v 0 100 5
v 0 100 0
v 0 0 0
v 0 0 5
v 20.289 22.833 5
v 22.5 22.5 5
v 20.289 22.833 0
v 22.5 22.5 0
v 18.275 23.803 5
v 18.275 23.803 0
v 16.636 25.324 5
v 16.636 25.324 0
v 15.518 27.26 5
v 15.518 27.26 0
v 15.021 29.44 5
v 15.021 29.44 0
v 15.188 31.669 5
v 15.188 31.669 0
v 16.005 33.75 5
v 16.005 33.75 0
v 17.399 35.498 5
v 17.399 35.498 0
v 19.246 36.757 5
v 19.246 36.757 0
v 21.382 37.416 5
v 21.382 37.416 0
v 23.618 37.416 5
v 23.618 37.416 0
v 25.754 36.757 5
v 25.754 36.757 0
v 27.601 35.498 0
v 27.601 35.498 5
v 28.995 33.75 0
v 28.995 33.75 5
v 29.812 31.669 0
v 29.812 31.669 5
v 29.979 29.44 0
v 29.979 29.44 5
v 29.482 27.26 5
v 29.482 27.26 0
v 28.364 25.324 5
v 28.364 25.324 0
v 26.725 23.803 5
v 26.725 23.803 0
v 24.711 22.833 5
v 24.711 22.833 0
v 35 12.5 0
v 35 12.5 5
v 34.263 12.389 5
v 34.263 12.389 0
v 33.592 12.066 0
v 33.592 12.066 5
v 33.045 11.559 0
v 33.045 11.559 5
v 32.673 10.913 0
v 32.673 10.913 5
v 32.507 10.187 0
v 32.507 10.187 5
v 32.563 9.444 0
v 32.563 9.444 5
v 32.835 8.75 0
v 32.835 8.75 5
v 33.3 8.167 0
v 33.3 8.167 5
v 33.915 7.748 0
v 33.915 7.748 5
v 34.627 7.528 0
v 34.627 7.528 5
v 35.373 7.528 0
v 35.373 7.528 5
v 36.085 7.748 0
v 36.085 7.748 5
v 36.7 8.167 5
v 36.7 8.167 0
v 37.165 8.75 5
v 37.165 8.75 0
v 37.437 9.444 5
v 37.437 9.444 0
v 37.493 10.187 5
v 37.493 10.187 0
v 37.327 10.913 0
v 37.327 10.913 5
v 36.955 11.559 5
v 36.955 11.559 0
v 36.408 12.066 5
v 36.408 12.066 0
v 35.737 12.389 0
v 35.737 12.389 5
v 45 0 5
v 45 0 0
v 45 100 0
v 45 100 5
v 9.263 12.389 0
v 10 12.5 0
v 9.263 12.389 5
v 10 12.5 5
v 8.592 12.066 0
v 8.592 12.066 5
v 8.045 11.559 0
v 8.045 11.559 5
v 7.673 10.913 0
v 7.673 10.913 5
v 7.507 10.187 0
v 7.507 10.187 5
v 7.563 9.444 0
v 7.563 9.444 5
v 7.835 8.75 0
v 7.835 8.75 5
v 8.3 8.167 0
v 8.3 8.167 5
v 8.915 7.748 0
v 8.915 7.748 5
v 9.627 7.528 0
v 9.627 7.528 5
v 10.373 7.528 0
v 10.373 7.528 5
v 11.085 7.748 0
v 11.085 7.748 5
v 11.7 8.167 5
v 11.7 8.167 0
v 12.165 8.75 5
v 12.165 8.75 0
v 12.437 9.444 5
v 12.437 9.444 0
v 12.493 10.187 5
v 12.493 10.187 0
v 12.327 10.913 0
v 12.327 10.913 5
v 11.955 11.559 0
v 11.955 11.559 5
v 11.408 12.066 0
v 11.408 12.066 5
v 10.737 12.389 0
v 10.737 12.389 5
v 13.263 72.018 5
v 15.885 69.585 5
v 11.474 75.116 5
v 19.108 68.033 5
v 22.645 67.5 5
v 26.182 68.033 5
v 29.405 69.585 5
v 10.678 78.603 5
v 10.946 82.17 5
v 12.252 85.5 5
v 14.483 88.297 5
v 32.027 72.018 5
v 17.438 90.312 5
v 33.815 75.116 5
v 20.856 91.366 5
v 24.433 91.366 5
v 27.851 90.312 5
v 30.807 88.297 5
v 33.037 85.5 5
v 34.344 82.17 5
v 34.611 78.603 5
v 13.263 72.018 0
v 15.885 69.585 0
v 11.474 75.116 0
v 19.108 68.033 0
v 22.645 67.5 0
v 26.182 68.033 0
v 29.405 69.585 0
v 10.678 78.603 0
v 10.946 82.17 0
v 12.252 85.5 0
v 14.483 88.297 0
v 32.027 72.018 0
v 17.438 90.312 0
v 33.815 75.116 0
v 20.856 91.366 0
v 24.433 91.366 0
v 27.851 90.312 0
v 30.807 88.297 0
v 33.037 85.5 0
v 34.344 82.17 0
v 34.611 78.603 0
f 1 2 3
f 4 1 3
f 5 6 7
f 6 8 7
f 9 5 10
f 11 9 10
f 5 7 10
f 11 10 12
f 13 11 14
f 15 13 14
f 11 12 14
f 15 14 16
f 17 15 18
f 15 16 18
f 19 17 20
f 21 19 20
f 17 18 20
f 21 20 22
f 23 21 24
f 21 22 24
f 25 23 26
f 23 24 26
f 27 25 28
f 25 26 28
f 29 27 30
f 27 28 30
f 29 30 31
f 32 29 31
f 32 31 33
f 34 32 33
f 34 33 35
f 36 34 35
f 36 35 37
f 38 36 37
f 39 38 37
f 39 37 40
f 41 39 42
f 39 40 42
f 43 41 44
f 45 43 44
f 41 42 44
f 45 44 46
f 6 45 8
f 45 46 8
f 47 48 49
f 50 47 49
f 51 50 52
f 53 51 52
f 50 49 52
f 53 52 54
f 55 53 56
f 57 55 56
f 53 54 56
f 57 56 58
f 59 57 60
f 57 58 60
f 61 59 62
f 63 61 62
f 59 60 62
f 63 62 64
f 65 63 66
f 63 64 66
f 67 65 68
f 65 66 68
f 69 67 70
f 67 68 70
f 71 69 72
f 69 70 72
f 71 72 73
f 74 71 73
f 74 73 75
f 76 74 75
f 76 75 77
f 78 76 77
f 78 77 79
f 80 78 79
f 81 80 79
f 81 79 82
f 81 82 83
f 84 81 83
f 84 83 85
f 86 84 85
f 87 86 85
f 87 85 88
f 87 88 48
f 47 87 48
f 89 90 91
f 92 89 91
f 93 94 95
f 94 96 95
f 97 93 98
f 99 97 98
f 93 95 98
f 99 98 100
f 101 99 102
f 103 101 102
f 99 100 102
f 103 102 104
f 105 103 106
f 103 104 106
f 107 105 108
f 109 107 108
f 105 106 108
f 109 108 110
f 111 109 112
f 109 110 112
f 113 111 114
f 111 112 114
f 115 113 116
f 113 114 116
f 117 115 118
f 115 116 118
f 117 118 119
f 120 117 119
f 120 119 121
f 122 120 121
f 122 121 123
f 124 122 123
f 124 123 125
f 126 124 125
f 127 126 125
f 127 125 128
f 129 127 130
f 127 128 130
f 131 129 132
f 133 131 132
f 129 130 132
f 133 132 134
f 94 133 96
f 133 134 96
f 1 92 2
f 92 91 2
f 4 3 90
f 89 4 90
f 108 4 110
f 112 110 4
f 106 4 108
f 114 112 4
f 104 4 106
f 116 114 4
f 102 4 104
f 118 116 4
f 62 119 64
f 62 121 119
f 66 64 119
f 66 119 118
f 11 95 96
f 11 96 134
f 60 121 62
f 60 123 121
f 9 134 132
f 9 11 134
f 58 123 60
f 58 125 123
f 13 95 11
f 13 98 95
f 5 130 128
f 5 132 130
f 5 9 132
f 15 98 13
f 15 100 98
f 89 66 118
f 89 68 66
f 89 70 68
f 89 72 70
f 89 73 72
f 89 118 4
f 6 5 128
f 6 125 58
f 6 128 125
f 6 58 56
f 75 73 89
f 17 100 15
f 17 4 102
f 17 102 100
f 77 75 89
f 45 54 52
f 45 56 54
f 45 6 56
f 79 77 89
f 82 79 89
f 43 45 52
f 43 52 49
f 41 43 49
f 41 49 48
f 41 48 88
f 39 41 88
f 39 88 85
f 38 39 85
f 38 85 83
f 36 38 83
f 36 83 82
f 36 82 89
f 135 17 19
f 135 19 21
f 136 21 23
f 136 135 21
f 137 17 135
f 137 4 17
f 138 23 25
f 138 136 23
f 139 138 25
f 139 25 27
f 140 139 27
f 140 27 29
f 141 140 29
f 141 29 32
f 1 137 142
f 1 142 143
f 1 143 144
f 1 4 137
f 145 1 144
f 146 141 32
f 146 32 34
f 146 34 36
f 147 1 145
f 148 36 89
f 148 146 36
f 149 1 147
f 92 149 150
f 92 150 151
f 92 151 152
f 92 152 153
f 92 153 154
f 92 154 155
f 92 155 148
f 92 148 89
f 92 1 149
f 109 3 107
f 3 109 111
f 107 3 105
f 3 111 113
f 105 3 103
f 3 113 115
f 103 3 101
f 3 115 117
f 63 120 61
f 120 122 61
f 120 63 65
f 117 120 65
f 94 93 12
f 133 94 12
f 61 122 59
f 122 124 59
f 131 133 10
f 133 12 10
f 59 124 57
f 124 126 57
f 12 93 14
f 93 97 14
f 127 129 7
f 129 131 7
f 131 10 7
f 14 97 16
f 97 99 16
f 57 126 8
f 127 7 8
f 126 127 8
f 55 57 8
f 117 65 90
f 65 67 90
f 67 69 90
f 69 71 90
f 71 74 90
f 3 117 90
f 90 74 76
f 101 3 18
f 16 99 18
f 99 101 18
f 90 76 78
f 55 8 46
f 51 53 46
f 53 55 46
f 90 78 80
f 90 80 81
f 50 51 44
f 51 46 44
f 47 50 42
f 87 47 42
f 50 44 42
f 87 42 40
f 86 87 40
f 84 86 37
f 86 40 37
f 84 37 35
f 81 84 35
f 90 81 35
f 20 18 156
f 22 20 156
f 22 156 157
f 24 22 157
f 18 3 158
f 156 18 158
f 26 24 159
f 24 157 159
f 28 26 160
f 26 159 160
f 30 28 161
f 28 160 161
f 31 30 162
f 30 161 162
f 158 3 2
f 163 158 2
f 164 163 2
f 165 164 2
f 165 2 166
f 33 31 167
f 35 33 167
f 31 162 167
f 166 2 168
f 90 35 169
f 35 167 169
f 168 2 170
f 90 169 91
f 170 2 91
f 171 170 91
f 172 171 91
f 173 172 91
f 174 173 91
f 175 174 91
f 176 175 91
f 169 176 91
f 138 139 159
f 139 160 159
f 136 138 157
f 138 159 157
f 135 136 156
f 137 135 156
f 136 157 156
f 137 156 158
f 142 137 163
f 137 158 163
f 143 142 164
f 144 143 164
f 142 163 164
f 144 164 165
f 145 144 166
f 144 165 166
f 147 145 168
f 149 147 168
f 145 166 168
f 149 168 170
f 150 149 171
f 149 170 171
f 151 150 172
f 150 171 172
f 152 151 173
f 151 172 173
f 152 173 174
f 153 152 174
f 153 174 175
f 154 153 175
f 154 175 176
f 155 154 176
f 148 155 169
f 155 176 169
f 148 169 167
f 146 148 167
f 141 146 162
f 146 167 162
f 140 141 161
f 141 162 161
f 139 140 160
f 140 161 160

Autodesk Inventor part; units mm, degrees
ref_plane "YZ Plane" through (0, 0, 0) normal (1, 0, 0) x (0, 1, 0)
ref_plane "XZ Plane" through (0, 0, 0) normal (0, 1, 0) x (-1, 0, 0)
ref_plane "XY Plane" through (0, 0, 0) normal (0, 0, 1) x (1, 0, 0)
sketch "スケッチ1" plane through (0, 0, 0) normal (0, 0, 1) x (1, 0, 0)
  line L0 (0, 0) -> (45, 0)
  line L1 (45, 0) -> (45, 100)
  line L2 (45, 100) -> (0, 100)
  line L3 (0, 100) -> (0, 0)
  dimension "d0" = 100
  dimension "d1" = 45
extrude "押し出し1" add sketch "スケッチ1" along normal blind 5
sketch "スケッチ2" plane through (0, 0, 5) normal (0, 0, 1) x (1, 0, 0)
  line L0 (0, 0) -> (45, 0) projected
  point P0 (22.6447, 79.5)
  dimension "d4" = 79.5
hole "穴1" at (22.6447, 79.5, 5) direction (0, 0, -1) diameter 24 end through all
sketch "スケッチ3" plane through (0, 0, 0) normal (0, 0, -1) x (-1, 0, 0)
  line L0 (0, 0) -> (-45, 0) projected
  line L1 (-45, 0) -> (-45, 100) projected
  line L2 (0, 100) -> (0, 0) projected
  point P0 (-10, 10)
  point P1 (-35, 10)
  dimension "d12" = 10
  dimension "d13" = 10
  dimension "d14" = 10
  dimension "d15" = 10
hole "穴2" at (10, 10, 0) at (35, 10, 0) direction (0, 0, 1) diameter 5 end through all
sketch "スケッチ4" plane through (0, 0, 5) normal (0, 0, 1) x (1, 0, 0)
  line L0 (0, 100) -> (0, 0) projected
  line L1 (0, 0) -> (45, 0) projected
  point P0 (22.5, 30)
  dimension "d23" = 22.5
  dimension "d24" = 30
hole "穴3" at (22.5, 30, 5) direction (0, 0, -1) diameter 15 depth 8 tip angle 118
properties part number "回転軸取り付け板"
